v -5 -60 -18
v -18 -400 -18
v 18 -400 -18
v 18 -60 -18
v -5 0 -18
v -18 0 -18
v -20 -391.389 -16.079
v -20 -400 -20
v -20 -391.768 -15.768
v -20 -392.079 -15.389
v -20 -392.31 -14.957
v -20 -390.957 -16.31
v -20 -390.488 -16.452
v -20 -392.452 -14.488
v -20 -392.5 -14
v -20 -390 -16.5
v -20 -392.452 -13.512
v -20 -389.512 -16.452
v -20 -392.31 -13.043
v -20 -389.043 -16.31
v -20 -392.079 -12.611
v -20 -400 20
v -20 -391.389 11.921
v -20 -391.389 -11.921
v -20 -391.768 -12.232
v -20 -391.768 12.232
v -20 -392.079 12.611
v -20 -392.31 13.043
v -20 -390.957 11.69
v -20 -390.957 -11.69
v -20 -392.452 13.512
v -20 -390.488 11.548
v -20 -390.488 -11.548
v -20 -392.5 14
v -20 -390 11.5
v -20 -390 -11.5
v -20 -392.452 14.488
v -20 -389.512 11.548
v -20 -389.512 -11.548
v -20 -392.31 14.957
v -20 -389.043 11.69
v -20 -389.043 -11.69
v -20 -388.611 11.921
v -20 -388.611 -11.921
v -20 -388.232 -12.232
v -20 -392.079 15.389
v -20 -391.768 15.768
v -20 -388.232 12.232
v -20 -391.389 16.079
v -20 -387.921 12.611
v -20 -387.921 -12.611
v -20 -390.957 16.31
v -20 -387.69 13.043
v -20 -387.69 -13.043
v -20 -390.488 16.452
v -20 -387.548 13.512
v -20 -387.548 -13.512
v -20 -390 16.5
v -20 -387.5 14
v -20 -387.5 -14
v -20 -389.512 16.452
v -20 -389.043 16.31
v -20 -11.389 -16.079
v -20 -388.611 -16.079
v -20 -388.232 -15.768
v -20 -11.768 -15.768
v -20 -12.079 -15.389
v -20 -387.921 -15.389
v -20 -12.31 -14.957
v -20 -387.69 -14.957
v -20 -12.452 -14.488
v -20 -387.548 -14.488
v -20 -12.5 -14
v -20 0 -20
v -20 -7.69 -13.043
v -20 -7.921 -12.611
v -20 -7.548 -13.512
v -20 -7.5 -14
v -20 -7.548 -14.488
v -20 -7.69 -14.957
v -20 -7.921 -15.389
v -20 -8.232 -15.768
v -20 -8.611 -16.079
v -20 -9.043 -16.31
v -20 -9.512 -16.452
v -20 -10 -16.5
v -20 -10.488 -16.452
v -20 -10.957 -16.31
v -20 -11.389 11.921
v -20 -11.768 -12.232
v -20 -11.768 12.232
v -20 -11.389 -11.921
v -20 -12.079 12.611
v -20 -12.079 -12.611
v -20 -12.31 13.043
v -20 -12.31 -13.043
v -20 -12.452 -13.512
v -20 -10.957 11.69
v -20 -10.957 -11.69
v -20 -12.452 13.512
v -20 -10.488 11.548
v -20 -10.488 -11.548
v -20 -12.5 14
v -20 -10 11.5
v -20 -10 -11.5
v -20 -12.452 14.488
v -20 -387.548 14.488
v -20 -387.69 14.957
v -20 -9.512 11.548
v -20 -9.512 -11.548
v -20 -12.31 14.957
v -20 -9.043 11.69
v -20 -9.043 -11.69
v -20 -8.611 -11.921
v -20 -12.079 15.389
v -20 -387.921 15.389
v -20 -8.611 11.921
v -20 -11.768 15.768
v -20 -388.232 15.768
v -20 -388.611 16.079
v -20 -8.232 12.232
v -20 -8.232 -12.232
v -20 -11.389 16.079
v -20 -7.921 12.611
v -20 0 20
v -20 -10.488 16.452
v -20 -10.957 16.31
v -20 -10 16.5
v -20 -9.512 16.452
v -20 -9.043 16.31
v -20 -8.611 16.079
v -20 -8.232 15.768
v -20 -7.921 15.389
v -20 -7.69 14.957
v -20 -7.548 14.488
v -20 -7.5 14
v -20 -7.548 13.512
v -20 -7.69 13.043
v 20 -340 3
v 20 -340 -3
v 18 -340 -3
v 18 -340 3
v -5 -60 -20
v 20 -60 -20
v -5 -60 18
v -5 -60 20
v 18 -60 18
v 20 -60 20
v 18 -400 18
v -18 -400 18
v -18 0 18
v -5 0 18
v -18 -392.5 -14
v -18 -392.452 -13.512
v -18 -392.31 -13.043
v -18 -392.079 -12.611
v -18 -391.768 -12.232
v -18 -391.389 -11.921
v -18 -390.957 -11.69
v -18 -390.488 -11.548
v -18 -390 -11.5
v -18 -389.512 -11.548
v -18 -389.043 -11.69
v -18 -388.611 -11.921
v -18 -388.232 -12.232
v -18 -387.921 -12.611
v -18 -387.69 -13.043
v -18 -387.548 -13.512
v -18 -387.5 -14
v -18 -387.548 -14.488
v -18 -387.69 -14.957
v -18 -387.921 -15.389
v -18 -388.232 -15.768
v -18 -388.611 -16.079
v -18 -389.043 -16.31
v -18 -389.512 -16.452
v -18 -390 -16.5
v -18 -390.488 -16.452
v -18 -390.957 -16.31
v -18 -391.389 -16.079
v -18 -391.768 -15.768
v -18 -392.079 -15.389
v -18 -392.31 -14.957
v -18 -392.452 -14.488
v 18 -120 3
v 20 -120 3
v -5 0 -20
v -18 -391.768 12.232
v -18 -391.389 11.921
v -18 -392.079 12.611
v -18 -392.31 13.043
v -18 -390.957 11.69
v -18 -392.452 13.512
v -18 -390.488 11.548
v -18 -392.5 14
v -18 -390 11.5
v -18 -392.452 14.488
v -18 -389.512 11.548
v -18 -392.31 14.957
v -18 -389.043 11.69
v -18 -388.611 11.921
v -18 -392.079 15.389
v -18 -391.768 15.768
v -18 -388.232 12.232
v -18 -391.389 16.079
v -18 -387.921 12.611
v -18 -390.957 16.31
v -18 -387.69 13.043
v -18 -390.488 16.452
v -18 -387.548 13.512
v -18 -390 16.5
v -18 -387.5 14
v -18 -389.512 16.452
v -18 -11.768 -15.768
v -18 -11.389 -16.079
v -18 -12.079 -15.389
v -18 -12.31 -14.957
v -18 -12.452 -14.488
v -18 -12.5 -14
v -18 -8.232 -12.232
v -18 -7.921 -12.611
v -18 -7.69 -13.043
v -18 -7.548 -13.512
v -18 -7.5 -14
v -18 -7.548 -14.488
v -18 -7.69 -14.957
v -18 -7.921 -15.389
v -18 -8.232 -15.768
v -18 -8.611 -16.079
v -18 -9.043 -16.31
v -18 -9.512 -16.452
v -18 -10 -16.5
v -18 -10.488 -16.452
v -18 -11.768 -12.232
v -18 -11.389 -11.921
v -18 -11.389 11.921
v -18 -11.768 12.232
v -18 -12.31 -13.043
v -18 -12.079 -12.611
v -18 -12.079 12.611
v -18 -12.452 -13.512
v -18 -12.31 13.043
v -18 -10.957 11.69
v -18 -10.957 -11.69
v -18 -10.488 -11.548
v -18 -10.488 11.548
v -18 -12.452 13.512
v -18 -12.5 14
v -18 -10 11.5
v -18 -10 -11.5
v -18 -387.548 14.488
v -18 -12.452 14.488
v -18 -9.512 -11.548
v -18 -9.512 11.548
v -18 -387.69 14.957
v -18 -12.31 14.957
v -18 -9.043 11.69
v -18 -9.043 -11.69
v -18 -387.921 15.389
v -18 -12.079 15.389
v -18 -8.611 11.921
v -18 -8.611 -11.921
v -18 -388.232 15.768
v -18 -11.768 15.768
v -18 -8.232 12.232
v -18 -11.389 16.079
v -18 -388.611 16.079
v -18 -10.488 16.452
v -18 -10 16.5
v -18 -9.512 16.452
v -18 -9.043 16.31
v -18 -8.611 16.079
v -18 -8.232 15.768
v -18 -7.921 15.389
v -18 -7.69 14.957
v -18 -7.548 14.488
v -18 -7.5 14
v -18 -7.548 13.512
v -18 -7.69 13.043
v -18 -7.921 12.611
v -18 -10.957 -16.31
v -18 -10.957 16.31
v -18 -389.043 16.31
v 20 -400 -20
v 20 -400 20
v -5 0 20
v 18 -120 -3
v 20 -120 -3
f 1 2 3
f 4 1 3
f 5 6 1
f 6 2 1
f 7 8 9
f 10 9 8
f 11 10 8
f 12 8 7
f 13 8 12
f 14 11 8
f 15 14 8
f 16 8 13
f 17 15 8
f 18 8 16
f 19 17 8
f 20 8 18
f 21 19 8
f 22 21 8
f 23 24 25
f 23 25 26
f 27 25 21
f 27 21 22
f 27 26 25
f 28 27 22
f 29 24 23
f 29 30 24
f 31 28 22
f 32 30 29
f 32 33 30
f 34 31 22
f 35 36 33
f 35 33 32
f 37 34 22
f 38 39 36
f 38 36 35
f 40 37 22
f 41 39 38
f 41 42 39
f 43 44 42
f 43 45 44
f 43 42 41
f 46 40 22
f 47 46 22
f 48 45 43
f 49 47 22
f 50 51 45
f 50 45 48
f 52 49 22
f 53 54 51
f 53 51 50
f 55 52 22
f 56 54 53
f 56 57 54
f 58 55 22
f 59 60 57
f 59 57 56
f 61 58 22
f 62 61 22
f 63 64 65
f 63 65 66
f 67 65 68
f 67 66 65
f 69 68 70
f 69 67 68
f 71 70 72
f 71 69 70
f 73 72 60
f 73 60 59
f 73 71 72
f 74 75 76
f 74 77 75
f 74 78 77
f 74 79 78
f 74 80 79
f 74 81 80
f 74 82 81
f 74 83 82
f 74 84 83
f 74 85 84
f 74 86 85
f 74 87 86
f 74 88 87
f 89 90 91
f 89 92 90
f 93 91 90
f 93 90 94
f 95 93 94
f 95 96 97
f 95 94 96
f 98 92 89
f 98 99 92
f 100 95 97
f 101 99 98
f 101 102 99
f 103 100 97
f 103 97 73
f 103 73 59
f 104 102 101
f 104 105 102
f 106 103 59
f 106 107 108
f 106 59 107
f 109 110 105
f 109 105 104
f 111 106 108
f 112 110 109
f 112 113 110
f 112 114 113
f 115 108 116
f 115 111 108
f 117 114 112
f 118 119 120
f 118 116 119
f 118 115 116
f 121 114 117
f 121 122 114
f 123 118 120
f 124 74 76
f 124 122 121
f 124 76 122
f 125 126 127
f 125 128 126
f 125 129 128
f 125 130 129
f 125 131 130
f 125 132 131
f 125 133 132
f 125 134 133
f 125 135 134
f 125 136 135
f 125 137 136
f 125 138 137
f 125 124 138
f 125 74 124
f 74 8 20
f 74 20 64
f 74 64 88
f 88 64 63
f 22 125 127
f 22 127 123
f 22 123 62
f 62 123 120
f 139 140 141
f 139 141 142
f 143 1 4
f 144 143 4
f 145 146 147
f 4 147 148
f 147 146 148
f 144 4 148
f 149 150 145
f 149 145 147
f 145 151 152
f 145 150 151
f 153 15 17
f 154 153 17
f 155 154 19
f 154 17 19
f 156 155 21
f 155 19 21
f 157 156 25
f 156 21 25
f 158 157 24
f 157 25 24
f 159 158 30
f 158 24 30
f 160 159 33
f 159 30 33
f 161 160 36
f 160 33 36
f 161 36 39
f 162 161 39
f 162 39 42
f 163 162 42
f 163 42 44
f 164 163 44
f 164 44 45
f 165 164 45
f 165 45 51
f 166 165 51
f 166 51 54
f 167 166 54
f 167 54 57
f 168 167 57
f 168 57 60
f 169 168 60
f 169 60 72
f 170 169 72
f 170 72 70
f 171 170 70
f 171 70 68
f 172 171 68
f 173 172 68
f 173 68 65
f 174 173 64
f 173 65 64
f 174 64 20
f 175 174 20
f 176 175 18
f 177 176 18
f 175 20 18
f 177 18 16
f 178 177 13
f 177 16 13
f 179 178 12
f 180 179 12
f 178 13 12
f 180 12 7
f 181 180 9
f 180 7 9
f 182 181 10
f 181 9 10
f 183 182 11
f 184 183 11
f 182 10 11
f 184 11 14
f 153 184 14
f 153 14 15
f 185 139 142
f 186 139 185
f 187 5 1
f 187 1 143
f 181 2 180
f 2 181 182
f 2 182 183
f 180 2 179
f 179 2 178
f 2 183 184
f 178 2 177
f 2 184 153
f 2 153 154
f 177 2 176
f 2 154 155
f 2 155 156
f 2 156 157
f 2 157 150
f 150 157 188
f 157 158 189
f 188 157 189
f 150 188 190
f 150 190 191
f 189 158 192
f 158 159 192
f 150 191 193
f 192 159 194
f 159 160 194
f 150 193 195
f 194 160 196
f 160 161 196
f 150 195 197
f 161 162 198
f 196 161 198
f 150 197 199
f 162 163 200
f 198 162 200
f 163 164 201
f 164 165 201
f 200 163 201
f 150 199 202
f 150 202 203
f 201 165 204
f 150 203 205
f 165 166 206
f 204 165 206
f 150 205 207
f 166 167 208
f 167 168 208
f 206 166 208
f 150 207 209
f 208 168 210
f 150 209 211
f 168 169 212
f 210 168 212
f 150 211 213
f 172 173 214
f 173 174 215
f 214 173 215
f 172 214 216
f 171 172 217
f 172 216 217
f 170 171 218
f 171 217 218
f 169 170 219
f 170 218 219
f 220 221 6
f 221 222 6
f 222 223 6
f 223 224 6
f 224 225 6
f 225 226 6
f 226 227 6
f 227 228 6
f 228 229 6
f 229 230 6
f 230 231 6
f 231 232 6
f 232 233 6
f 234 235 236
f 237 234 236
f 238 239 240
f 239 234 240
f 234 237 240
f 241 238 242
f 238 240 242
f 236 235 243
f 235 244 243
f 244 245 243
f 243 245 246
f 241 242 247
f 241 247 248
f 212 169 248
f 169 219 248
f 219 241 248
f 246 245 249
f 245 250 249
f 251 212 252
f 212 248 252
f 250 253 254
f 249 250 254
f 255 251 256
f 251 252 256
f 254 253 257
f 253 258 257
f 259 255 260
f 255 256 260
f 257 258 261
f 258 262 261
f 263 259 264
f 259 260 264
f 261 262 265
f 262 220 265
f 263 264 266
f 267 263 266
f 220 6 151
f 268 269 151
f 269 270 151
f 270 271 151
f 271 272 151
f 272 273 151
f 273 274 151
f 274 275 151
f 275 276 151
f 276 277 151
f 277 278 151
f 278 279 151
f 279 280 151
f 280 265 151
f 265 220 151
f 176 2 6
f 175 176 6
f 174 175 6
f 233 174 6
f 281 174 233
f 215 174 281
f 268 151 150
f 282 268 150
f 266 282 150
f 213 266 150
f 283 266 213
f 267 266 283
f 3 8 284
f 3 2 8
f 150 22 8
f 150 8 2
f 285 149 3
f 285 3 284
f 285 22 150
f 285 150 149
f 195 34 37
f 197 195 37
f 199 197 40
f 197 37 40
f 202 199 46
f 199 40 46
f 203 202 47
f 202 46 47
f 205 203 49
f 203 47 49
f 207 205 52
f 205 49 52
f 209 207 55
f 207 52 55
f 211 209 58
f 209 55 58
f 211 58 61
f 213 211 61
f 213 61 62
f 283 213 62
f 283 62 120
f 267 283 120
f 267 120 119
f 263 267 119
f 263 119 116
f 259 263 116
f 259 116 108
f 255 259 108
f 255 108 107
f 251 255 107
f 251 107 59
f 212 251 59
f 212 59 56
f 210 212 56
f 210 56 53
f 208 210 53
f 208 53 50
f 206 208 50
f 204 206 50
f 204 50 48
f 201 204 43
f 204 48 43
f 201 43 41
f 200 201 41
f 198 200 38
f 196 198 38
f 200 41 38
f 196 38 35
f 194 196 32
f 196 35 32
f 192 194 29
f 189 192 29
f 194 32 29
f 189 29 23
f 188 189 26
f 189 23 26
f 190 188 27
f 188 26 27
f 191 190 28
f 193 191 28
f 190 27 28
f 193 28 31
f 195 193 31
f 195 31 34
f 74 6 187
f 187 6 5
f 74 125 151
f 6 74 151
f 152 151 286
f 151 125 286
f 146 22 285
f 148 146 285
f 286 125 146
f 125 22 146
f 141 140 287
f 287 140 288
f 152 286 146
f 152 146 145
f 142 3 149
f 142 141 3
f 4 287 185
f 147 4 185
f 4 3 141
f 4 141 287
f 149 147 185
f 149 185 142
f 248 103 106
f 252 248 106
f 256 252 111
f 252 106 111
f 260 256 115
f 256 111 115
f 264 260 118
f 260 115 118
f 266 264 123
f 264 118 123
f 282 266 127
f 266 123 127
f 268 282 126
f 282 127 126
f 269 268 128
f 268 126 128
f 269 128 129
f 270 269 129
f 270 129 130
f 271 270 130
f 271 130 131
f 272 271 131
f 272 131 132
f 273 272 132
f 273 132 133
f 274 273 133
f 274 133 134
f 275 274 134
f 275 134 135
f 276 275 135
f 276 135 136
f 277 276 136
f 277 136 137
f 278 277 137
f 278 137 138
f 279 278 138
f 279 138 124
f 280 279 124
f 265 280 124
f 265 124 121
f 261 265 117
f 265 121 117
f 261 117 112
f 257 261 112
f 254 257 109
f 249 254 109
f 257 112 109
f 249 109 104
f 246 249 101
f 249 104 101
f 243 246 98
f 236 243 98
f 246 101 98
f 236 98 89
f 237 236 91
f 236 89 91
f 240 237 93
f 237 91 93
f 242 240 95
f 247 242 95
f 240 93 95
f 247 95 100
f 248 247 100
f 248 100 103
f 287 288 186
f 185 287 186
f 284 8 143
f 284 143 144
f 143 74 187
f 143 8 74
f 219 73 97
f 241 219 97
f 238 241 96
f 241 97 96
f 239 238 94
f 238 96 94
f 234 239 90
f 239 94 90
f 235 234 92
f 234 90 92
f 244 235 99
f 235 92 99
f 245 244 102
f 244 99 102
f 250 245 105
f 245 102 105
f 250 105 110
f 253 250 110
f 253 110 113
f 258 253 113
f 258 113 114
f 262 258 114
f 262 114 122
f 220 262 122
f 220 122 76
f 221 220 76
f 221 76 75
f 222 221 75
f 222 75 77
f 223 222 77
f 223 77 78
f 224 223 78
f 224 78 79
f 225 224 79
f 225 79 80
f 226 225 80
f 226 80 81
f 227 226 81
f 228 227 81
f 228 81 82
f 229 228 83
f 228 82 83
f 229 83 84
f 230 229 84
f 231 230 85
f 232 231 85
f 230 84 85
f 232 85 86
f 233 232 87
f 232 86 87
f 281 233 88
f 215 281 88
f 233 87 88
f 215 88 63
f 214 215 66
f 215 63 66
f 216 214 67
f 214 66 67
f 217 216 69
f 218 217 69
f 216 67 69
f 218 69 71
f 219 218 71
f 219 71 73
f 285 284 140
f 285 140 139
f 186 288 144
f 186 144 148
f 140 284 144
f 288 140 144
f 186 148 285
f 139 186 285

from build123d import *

# Parameters (mm, degrees)
F0_W     = 40
F0_H     = 40
F0_W_2   = 36
F0_H_2   = 36
F1_DEPTH = 400
F2_W     = 220
F2_H     = 6
F3_DEPTH = 2
F5_DEPTH = 60
F6_R     = 2.5
F7_DEPTH = 25


with BuildPart() as f1:
    # F0 (on Front) → F1 (new body)
    with BuildSketch(Plane.XZ):
        Rectangle(F0_W, F0_H)
        Rectangle(F0_W_2, F0_H_2, mode=Mode.SUBTRACT)
    extrude(amount=F1_DEPTH)

    # F2 (on face) → F3 (cut)
    with BuildSketch(Plane.YZ.offset(20)):
        with Locations((-230, 0)):
            Rectangle(F2_W, F2_H)
    extrude(amount=-F3_DEPTH, mode=Mode.SUBTRACT)

    # F4 (on Front) → F5 (cut)
    with BuildSketch(Plane.XZ):
        Polygon((-5, -18), (-5, -20), (20, -20), (20, 20), (-5, 20), (-5, 18), (18, 18), (18, -18), align=None)
    extrude(amount=F5_DEPTH, mode=Mode.SUBTRACT)

    # F6 (on face) → F7 (cut)
    with BuildSketch(Plane(origin=(-20, 0, 0), x_dir=(0, -1, 0), z_dir=(-1, 0, 0))):
        with Locations((10, 14)):
            Circle(F6_R)
        with Locations((10, -14)):
            Circle(F6_R)
        with Locations((390, 14)):
            Circle(F6_R)
        with Locations((390, -14)):
            Circle(F6_R)
    extrude(amount=-F7_DEPTH, mode=Mode.SUBTRACT)


solid = f1.part
